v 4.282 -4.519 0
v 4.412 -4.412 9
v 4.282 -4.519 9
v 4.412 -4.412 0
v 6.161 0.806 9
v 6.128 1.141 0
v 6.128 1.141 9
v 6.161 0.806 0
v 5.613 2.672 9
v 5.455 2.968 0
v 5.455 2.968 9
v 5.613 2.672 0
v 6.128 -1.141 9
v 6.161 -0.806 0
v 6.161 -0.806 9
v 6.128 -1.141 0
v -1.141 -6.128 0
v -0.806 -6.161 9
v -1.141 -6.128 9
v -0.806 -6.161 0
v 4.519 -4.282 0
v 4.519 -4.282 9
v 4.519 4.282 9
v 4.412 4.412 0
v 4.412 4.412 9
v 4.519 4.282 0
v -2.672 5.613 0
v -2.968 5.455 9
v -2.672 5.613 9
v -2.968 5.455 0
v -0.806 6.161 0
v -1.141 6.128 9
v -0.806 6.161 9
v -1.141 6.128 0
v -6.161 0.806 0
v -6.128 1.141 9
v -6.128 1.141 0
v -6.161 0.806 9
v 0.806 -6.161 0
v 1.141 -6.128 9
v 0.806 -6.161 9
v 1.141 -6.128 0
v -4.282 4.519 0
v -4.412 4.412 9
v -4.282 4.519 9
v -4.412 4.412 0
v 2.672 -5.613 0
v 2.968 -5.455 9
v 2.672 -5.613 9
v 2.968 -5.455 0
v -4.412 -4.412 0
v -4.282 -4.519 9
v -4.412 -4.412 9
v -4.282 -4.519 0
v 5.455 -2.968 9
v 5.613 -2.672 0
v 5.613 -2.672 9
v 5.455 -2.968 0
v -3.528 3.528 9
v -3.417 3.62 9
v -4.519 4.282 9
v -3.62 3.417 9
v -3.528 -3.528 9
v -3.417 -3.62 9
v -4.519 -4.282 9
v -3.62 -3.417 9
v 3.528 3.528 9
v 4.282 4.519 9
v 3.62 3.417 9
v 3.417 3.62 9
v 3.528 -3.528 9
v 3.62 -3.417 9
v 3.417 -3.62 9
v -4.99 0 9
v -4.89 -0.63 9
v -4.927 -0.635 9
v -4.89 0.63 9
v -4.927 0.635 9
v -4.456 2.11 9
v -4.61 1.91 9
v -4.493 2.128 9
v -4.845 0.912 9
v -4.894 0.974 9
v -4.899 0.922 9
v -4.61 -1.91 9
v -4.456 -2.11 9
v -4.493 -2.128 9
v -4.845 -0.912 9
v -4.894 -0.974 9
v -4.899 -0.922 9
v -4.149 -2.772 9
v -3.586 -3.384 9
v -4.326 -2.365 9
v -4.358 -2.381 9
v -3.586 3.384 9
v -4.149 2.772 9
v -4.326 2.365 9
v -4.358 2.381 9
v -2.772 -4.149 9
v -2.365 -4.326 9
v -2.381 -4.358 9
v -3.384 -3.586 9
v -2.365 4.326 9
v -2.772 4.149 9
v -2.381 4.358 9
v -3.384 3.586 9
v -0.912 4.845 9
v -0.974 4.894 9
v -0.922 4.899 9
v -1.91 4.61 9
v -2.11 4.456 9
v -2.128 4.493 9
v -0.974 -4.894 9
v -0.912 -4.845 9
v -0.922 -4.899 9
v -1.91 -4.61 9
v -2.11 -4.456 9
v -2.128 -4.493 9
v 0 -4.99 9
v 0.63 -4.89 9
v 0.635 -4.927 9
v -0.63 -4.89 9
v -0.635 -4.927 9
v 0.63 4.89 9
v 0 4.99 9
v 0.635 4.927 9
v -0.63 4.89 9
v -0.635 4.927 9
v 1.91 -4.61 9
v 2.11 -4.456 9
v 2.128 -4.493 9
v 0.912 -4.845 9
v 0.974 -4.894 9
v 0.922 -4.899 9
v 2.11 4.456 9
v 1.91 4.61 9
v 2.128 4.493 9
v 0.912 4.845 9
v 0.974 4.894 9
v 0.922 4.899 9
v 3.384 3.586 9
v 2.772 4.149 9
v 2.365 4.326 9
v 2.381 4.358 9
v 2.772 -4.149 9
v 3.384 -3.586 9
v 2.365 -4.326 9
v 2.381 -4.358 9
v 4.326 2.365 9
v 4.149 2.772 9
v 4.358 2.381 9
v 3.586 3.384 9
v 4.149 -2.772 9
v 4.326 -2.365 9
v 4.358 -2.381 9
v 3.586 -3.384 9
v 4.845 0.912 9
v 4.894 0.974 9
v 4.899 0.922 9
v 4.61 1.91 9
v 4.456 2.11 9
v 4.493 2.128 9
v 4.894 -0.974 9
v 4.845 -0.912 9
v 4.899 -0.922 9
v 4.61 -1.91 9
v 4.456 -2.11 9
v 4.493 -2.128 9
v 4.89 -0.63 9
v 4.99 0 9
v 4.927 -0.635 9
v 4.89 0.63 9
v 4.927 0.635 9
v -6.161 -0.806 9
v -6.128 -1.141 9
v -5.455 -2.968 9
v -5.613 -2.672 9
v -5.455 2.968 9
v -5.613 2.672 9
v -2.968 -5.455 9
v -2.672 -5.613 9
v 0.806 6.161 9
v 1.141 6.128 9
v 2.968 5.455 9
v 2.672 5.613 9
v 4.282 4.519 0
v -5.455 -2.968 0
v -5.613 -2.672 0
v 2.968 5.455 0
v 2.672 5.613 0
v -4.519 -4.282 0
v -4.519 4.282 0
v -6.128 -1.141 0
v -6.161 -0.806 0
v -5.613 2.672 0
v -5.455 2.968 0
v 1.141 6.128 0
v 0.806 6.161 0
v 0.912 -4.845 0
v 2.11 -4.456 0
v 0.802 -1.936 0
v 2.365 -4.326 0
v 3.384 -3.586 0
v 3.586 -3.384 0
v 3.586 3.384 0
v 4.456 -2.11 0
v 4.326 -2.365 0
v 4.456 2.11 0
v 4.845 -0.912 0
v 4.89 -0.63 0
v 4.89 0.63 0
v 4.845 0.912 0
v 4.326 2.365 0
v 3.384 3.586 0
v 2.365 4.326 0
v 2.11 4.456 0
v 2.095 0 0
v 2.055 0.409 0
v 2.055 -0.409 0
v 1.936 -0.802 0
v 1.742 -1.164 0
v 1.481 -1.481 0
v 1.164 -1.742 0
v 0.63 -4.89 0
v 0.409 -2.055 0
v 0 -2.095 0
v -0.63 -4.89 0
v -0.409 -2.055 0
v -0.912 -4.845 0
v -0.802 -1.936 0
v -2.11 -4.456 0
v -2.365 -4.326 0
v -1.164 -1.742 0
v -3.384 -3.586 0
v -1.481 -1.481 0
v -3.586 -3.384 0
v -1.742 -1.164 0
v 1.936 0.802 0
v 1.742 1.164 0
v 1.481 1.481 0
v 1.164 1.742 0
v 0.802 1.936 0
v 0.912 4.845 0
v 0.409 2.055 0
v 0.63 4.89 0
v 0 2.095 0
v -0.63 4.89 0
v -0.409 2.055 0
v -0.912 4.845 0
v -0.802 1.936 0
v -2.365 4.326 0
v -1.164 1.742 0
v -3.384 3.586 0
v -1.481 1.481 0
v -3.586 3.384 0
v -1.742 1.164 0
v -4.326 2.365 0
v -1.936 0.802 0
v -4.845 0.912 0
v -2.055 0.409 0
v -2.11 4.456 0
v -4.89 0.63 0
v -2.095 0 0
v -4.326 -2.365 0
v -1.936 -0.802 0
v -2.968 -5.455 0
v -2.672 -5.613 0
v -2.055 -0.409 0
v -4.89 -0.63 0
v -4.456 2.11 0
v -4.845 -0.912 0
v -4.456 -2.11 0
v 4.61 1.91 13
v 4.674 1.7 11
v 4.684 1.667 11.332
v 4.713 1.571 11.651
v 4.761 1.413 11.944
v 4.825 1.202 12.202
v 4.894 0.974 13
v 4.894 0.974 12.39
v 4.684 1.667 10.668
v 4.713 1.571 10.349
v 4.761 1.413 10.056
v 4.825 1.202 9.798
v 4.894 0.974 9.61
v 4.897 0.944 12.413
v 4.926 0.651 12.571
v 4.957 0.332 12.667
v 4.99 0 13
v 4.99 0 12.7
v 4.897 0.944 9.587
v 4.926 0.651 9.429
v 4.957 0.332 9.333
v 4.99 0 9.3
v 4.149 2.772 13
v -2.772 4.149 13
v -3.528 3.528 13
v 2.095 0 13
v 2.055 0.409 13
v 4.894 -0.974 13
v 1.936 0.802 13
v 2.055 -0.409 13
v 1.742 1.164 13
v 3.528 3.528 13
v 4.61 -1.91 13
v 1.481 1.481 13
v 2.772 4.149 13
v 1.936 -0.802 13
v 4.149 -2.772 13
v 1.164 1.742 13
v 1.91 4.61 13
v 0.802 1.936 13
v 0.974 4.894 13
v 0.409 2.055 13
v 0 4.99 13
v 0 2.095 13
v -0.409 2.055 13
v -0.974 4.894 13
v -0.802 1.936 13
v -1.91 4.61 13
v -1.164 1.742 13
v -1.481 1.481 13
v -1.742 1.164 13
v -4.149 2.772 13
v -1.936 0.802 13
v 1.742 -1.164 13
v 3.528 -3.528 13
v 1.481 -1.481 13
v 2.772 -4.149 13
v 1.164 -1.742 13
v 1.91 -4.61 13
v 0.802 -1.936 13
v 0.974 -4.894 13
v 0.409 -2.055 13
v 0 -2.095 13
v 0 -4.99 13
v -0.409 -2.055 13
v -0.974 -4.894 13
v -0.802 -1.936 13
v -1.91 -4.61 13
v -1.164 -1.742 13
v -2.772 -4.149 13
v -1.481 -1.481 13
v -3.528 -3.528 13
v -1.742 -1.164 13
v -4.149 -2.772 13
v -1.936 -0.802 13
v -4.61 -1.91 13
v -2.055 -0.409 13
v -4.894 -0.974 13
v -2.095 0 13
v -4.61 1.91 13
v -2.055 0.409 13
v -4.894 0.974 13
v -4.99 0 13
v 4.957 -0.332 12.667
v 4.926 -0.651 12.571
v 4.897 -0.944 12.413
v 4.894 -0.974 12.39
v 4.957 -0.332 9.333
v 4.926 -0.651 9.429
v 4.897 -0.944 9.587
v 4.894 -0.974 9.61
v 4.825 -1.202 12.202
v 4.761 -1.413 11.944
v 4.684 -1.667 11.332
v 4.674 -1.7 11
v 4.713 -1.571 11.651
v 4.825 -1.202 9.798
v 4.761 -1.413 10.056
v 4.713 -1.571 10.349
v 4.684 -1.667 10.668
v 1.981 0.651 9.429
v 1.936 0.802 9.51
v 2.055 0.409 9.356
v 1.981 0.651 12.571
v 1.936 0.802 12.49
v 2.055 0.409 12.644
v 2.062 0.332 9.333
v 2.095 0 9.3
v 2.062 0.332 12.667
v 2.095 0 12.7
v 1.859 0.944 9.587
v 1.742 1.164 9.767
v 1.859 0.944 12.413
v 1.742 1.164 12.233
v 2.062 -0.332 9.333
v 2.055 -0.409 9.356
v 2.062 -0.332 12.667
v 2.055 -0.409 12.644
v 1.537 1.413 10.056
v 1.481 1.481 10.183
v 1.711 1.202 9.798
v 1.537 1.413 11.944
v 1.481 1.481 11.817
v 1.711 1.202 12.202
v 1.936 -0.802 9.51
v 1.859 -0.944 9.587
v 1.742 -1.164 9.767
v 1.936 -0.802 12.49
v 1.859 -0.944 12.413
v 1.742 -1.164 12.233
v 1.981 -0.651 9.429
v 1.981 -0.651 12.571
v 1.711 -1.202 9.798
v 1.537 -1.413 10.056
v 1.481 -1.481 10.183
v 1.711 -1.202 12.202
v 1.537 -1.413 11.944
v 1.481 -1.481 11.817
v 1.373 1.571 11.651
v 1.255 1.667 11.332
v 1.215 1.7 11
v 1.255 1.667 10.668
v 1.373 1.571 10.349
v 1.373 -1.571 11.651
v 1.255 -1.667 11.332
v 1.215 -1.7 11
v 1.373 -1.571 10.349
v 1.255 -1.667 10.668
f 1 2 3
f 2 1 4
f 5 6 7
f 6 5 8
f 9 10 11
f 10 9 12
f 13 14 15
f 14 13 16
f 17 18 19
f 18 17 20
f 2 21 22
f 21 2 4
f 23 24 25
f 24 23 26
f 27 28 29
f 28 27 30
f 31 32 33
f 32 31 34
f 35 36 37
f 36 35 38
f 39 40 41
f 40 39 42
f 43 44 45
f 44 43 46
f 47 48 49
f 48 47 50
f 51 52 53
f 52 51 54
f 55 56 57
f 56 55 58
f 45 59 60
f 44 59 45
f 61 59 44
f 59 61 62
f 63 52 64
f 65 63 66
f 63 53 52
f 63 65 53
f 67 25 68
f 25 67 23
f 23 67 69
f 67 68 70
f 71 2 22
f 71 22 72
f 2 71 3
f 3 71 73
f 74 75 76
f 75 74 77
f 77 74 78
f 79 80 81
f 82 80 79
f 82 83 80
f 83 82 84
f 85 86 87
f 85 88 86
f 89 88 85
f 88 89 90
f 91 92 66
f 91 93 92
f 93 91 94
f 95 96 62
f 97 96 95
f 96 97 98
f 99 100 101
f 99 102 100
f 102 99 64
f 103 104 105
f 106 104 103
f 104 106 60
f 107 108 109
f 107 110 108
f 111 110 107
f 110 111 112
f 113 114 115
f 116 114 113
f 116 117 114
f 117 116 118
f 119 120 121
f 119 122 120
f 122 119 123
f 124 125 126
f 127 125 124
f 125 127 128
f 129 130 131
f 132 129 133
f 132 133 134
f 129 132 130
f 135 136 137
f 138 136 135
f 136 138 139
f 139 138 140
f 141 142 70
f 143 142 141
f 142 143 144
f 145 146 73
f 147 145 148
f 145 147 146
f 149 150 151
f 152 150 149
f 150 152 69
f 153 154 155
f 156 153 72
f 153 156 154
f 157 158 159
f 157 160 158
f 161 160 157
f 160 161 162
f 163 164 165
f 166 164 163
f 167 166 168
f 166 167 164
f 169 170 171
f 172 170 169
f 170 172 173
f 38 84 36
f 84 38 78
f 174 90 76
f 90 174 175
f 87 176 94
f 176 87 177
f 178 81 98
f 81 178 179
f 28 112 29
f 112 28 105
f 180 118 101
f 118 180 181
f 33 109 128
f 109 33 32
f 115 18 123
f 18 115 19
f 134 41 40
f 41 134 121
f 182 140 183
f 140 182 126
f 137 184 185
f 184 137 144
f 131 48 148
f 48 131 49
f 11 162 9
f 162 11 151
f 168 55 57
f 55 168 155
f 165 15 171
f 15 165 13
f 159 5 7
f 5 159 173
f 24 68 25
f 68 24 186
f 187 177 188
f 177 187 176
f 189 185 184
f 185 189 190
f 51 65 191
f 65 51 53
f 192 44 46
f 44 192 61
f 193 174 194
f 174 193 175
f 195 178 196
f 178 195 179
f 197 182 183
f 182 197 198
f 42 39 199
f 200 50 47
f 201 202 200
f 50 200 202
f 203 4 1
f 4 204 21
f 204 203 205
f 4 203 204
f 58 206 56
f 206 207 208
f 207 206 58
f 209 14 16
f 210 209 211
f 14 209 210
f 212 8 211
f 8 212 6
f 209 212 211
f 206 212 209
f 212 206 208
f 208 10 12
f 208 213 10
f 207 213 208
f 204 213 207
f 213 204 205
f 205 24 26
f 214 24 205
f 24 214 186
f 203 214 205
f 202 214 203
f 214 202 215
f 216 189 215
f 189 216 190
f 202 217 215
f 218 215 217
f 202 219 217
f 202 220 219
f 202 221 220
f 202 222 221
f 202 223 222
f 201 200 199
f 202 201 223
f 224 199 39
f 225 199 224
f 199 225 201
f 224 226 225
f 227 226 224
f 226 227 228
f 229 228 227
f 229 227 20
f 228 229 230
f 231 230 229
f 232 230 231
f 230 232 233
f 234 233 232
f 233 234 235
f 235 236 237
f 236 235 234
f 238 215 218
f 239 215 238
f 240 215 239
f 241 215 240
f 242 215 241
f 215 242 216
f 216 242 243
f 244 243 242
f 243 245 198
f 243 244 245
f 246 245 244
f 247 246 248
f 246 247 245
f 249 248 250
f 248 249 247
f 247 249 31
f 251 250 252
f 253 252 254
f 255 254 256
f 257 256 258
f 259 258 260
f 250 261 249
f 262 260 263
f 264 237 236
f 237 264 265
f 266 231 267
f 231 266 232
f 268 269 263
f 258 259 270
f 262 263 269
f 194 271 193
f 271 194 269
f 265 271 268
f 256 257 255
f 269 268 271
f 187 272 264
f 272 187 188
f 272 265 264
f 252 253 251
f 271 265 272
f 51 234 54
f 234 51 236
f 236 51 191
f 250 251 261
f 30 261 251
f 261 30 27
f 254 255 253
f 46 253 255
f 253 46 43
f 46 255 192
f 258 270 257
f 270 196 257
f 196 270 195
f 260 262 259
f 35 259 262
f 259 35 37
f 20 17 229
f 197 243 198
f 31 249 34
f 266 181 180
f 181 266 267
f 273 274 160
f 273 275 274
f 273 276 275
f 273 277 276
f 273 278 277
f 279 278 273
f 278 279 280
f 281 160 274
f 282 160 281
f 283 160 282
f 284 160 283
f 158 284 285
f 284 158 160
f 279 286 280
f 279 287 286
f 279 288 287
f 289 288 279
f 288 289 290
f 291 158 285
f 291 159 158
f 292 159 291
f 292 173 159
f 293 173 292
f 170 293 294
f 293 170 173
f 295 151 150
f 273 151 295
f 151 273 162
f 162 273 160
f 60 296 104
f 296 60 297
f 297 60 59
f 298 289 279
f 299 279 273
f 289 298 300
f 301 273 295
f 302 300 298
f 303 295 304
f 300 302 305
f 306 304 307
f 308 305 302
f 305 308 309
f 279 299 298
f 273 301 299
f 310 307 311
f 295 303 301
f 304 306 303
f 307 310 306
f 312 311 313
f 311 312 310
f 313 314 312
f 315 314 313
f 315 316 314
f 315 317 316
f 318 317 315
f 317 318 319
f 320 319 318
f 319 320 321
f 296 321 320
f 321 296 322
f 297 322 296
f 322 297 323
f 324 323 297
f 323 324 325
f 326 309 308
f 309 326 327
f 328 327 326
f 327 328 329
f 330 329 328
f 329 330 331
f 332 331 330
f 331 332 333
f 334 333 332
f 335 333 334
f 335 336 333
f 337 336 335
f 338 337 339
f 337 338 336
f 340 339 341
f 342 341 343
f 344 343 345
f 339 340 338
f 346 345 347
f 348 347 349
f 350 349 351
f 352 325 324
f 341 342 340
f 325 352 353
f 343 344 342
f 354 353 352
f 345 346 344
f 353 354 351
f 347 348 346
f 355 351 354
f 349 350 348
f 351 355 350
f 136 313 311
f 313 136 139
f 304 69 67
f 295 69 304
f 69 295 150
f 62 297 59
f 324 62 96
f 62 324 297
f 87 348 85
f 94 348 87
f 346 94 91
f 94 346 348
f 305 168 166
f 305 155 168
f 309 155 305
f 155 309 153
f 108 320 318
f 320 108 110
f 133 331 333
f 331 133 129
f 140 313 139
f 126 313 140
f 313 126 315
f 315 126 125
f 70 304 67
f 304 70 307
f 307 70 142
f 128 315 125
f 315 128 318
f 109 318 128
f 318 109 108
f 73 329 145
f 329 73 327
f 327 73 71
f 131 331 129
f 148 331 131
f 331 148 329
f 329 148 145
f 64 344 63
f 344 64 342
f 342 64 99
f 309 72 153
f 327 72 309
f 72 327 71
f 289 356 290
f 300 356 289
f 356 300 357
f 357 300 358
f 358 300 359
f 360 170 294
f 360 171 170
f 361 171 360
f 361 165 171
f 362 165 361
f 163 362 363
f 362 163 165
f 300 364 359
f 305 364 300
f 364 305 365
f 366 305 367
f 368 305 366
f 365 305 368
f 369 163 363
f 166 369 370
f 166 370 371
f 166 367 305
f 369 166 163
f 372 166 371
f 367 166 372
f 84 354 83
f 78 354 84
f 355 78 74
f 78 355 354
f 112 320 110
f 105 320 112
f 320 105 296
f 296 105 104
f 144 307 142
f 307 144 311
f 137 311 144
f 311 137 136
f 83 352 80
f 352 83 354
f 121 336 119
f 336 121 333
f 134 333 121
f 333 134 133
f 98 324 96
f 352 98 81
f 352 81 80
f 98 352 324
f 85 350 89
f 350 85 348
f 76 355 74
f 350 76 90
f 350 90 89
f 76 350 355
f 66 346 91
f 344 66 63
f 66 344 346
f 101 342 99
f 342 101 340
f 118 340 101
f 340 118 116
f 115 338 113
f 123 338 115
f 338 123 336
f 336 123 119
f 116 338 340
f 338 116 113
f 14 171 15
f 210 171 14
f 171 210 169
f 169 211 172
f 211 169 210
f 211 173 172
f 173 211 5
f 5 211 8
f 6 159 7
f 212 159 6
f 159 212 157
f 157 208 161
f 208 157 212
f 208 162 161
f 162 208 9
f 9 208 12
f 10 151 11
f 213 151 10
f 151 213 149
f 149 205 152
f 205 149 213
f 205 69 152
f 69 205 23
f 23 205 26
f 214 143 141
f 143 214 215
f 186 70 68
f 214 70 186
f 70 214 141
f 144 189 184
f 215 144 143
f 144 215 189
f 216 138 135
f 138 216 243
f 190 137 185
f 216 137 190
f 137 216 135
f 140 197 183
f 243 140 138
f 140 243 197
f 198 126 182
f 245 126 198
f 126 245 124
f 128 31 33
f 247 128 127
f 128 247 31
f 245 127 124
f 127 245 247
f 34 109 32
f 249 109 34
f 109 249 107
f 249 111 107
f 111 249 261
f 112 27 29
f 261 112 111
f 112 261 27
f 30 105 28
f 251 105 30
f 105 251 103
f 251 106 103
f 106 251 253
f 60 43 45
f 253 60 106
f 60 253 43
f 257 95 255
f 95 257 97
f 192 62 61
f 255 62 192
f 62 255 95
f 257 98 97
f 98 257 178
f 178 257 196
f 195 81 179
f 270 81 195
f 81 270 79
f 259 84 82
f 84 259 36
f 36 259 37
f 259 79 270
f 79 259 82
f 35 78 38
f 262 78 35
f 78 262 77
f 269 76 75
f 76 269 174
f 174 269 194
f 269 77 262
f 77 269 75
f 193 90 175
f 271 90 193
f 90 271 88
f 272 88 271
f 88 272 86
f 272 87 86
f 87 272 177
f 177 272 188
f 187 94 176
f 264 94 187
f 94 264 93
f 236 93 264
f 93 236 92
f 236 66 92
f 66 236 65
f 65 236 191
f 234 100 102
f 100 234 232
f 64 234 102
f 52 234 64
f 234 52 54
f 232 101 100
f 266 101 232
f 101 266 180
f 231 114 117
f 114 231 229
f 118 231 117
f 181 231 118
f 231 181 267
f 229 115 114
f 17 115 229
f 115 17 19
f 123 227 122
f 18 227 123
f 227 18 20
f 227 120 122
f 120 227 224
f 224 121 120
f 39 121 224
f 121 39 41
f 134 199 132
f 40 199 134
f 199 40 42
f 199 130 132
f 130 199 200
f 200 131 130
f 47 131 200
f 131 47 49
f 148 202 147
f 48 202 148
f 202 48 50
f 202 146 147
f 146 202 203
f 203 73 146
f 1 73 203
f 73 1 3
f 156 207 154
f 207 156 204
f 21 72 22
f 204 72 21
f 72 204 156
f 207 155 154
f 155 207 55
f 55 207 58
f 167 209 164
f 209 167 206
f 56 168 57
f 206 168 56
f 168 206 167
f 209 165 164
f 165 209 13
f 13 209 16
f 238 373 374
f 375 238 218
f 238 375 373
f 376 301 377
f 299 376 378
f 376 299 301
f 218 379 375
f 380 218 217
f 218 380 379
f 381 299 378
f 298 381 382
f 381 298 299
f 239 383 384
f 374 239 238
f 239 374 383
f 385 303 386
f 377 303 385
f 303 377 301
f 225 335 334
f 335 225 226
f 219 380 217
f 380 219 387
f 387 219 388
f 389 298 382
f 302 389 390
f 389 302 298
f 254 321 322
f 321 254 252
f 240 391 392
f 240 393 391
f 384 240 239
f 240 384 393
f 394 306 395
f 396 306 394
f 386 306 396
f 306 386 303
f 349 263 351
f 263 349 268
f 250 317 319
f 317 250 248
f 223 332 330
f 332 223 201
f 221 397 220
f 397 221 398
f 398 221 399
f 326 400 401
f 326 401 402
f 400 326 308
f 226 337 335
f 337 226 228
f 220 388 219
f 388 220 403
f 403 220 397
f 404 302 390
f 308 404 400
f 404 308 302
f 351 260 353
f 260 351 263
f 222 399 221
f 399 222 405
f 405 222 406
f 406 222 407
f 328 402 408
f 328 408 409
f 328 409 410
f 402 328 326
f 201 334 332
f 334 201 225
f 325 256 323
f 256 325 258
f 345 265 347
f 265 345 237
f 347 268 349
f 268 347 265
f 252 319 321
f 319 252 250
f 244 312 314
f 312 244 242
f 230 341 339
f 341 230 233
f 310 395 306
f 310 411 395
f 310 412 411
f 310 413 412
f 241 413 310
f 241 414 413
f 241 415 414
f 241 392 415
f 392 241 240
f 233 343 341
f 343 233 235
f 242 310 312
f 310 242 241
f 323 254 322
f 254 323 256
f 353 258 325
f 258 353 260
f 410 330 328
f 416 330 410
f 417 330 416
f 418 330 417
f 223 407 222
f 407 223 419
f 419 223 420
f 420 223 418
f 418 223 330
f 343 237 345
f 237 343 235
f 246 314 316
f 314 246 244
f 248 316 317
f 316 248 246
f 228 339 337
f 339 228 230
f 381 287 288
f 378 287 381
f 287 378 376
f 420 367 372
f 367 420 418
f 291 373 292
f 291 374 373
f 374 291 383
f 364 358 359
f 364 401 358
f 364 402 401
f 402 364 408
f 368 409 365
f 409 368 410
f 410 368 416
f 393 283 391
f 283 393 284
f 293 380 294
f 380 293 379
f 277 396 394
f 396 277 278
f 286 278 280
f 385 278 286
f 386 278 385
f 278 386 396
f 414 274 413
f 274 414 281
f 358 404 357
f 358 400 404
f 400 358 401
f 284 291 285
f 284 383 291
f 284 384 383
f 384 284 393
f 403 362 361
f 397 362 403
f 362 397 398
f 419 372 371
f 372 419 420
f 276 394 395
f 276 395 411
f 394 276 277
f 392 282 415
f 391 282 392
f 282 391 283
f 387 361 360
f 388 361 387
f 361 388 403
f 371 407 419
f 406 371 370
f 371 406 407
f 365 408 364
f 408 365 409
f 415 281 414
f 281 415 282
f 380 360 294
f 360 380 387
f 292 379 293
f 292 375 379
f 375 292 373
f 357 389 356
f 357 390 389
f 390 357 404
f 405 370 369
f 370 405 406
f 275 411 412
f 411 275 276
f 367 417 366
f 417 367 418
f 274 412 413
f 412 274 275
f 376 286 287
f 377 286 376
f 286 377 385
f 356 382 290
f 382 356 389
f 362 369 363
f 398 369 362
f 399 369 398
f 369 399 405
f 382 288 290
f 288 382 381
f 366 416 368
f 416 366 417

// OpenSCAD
$fn = 32;

// ----------------------------------------------------------------------
// Timing pulley: GT2 20T, pitch 2 mm, 12.48 mm x 13 mm
// ----------------------------------------------------------------------

// --- parameters (mm) ---
belt_pitch = 2;           // belt pitch
n_teeth = 20;             // number of grooves
rim_w = 9;                // belt width between the flanges
tip_d = 12.48;            // tip circle diameter
root_d = 10.98;           // groove bottom diameter
groove_h = 0.75;          // groove depth
tooth_w = 1.5;            // groove width at the tip circle
shaft_d = 4.19;           // shaft bore
hub_d = 9.98;             // hub diameter
hub_h = 4;                // hub above the flange
bottom_z = 0;             // lowest point of the pulley
top_z = 13;               // highest point of the pulley
set_d = 3.4;              // set screw tap hole

module rim() {
  cylinder(h = rim_w, d = tip_d);
}

module groove_cutter() {
  /* belt tooth groove: deeper than wide, cut through the belt width */
  translate([root_d / 2, 0, 0])
    linear_extrude(height = rim_w)
      polygon(points = [[-0.6, -tooth_w * 0.42], [groove_h + 0.6, -tooth_w * 0.6],
                        [groove_h + 0.6, tooth_w * 0.6], [-0.6, tooth_w * 0.42]]);
}

module hub() {
  translate([0, 0, bottom_z]) cylinder(h = top_z - bottom_z, d = hub_d);
}

difference() {
  union() {
    rim();
    hub();
  }
  for (i = [0 : n_teeth - 1]) rotate([0, 0, i * 360 / n_teeth]) groove_cutter();
  translate([0, 0, bottom_z - 1]) cylinder(h = top_z - bottom_z + 2, d = shaft_d);
  translate([-1, 0, top_z - hub_h * 0.5]) rotate([0, 90, 0]) cylinder(h = hub_d / 2 + 3, d = set_d);
}
